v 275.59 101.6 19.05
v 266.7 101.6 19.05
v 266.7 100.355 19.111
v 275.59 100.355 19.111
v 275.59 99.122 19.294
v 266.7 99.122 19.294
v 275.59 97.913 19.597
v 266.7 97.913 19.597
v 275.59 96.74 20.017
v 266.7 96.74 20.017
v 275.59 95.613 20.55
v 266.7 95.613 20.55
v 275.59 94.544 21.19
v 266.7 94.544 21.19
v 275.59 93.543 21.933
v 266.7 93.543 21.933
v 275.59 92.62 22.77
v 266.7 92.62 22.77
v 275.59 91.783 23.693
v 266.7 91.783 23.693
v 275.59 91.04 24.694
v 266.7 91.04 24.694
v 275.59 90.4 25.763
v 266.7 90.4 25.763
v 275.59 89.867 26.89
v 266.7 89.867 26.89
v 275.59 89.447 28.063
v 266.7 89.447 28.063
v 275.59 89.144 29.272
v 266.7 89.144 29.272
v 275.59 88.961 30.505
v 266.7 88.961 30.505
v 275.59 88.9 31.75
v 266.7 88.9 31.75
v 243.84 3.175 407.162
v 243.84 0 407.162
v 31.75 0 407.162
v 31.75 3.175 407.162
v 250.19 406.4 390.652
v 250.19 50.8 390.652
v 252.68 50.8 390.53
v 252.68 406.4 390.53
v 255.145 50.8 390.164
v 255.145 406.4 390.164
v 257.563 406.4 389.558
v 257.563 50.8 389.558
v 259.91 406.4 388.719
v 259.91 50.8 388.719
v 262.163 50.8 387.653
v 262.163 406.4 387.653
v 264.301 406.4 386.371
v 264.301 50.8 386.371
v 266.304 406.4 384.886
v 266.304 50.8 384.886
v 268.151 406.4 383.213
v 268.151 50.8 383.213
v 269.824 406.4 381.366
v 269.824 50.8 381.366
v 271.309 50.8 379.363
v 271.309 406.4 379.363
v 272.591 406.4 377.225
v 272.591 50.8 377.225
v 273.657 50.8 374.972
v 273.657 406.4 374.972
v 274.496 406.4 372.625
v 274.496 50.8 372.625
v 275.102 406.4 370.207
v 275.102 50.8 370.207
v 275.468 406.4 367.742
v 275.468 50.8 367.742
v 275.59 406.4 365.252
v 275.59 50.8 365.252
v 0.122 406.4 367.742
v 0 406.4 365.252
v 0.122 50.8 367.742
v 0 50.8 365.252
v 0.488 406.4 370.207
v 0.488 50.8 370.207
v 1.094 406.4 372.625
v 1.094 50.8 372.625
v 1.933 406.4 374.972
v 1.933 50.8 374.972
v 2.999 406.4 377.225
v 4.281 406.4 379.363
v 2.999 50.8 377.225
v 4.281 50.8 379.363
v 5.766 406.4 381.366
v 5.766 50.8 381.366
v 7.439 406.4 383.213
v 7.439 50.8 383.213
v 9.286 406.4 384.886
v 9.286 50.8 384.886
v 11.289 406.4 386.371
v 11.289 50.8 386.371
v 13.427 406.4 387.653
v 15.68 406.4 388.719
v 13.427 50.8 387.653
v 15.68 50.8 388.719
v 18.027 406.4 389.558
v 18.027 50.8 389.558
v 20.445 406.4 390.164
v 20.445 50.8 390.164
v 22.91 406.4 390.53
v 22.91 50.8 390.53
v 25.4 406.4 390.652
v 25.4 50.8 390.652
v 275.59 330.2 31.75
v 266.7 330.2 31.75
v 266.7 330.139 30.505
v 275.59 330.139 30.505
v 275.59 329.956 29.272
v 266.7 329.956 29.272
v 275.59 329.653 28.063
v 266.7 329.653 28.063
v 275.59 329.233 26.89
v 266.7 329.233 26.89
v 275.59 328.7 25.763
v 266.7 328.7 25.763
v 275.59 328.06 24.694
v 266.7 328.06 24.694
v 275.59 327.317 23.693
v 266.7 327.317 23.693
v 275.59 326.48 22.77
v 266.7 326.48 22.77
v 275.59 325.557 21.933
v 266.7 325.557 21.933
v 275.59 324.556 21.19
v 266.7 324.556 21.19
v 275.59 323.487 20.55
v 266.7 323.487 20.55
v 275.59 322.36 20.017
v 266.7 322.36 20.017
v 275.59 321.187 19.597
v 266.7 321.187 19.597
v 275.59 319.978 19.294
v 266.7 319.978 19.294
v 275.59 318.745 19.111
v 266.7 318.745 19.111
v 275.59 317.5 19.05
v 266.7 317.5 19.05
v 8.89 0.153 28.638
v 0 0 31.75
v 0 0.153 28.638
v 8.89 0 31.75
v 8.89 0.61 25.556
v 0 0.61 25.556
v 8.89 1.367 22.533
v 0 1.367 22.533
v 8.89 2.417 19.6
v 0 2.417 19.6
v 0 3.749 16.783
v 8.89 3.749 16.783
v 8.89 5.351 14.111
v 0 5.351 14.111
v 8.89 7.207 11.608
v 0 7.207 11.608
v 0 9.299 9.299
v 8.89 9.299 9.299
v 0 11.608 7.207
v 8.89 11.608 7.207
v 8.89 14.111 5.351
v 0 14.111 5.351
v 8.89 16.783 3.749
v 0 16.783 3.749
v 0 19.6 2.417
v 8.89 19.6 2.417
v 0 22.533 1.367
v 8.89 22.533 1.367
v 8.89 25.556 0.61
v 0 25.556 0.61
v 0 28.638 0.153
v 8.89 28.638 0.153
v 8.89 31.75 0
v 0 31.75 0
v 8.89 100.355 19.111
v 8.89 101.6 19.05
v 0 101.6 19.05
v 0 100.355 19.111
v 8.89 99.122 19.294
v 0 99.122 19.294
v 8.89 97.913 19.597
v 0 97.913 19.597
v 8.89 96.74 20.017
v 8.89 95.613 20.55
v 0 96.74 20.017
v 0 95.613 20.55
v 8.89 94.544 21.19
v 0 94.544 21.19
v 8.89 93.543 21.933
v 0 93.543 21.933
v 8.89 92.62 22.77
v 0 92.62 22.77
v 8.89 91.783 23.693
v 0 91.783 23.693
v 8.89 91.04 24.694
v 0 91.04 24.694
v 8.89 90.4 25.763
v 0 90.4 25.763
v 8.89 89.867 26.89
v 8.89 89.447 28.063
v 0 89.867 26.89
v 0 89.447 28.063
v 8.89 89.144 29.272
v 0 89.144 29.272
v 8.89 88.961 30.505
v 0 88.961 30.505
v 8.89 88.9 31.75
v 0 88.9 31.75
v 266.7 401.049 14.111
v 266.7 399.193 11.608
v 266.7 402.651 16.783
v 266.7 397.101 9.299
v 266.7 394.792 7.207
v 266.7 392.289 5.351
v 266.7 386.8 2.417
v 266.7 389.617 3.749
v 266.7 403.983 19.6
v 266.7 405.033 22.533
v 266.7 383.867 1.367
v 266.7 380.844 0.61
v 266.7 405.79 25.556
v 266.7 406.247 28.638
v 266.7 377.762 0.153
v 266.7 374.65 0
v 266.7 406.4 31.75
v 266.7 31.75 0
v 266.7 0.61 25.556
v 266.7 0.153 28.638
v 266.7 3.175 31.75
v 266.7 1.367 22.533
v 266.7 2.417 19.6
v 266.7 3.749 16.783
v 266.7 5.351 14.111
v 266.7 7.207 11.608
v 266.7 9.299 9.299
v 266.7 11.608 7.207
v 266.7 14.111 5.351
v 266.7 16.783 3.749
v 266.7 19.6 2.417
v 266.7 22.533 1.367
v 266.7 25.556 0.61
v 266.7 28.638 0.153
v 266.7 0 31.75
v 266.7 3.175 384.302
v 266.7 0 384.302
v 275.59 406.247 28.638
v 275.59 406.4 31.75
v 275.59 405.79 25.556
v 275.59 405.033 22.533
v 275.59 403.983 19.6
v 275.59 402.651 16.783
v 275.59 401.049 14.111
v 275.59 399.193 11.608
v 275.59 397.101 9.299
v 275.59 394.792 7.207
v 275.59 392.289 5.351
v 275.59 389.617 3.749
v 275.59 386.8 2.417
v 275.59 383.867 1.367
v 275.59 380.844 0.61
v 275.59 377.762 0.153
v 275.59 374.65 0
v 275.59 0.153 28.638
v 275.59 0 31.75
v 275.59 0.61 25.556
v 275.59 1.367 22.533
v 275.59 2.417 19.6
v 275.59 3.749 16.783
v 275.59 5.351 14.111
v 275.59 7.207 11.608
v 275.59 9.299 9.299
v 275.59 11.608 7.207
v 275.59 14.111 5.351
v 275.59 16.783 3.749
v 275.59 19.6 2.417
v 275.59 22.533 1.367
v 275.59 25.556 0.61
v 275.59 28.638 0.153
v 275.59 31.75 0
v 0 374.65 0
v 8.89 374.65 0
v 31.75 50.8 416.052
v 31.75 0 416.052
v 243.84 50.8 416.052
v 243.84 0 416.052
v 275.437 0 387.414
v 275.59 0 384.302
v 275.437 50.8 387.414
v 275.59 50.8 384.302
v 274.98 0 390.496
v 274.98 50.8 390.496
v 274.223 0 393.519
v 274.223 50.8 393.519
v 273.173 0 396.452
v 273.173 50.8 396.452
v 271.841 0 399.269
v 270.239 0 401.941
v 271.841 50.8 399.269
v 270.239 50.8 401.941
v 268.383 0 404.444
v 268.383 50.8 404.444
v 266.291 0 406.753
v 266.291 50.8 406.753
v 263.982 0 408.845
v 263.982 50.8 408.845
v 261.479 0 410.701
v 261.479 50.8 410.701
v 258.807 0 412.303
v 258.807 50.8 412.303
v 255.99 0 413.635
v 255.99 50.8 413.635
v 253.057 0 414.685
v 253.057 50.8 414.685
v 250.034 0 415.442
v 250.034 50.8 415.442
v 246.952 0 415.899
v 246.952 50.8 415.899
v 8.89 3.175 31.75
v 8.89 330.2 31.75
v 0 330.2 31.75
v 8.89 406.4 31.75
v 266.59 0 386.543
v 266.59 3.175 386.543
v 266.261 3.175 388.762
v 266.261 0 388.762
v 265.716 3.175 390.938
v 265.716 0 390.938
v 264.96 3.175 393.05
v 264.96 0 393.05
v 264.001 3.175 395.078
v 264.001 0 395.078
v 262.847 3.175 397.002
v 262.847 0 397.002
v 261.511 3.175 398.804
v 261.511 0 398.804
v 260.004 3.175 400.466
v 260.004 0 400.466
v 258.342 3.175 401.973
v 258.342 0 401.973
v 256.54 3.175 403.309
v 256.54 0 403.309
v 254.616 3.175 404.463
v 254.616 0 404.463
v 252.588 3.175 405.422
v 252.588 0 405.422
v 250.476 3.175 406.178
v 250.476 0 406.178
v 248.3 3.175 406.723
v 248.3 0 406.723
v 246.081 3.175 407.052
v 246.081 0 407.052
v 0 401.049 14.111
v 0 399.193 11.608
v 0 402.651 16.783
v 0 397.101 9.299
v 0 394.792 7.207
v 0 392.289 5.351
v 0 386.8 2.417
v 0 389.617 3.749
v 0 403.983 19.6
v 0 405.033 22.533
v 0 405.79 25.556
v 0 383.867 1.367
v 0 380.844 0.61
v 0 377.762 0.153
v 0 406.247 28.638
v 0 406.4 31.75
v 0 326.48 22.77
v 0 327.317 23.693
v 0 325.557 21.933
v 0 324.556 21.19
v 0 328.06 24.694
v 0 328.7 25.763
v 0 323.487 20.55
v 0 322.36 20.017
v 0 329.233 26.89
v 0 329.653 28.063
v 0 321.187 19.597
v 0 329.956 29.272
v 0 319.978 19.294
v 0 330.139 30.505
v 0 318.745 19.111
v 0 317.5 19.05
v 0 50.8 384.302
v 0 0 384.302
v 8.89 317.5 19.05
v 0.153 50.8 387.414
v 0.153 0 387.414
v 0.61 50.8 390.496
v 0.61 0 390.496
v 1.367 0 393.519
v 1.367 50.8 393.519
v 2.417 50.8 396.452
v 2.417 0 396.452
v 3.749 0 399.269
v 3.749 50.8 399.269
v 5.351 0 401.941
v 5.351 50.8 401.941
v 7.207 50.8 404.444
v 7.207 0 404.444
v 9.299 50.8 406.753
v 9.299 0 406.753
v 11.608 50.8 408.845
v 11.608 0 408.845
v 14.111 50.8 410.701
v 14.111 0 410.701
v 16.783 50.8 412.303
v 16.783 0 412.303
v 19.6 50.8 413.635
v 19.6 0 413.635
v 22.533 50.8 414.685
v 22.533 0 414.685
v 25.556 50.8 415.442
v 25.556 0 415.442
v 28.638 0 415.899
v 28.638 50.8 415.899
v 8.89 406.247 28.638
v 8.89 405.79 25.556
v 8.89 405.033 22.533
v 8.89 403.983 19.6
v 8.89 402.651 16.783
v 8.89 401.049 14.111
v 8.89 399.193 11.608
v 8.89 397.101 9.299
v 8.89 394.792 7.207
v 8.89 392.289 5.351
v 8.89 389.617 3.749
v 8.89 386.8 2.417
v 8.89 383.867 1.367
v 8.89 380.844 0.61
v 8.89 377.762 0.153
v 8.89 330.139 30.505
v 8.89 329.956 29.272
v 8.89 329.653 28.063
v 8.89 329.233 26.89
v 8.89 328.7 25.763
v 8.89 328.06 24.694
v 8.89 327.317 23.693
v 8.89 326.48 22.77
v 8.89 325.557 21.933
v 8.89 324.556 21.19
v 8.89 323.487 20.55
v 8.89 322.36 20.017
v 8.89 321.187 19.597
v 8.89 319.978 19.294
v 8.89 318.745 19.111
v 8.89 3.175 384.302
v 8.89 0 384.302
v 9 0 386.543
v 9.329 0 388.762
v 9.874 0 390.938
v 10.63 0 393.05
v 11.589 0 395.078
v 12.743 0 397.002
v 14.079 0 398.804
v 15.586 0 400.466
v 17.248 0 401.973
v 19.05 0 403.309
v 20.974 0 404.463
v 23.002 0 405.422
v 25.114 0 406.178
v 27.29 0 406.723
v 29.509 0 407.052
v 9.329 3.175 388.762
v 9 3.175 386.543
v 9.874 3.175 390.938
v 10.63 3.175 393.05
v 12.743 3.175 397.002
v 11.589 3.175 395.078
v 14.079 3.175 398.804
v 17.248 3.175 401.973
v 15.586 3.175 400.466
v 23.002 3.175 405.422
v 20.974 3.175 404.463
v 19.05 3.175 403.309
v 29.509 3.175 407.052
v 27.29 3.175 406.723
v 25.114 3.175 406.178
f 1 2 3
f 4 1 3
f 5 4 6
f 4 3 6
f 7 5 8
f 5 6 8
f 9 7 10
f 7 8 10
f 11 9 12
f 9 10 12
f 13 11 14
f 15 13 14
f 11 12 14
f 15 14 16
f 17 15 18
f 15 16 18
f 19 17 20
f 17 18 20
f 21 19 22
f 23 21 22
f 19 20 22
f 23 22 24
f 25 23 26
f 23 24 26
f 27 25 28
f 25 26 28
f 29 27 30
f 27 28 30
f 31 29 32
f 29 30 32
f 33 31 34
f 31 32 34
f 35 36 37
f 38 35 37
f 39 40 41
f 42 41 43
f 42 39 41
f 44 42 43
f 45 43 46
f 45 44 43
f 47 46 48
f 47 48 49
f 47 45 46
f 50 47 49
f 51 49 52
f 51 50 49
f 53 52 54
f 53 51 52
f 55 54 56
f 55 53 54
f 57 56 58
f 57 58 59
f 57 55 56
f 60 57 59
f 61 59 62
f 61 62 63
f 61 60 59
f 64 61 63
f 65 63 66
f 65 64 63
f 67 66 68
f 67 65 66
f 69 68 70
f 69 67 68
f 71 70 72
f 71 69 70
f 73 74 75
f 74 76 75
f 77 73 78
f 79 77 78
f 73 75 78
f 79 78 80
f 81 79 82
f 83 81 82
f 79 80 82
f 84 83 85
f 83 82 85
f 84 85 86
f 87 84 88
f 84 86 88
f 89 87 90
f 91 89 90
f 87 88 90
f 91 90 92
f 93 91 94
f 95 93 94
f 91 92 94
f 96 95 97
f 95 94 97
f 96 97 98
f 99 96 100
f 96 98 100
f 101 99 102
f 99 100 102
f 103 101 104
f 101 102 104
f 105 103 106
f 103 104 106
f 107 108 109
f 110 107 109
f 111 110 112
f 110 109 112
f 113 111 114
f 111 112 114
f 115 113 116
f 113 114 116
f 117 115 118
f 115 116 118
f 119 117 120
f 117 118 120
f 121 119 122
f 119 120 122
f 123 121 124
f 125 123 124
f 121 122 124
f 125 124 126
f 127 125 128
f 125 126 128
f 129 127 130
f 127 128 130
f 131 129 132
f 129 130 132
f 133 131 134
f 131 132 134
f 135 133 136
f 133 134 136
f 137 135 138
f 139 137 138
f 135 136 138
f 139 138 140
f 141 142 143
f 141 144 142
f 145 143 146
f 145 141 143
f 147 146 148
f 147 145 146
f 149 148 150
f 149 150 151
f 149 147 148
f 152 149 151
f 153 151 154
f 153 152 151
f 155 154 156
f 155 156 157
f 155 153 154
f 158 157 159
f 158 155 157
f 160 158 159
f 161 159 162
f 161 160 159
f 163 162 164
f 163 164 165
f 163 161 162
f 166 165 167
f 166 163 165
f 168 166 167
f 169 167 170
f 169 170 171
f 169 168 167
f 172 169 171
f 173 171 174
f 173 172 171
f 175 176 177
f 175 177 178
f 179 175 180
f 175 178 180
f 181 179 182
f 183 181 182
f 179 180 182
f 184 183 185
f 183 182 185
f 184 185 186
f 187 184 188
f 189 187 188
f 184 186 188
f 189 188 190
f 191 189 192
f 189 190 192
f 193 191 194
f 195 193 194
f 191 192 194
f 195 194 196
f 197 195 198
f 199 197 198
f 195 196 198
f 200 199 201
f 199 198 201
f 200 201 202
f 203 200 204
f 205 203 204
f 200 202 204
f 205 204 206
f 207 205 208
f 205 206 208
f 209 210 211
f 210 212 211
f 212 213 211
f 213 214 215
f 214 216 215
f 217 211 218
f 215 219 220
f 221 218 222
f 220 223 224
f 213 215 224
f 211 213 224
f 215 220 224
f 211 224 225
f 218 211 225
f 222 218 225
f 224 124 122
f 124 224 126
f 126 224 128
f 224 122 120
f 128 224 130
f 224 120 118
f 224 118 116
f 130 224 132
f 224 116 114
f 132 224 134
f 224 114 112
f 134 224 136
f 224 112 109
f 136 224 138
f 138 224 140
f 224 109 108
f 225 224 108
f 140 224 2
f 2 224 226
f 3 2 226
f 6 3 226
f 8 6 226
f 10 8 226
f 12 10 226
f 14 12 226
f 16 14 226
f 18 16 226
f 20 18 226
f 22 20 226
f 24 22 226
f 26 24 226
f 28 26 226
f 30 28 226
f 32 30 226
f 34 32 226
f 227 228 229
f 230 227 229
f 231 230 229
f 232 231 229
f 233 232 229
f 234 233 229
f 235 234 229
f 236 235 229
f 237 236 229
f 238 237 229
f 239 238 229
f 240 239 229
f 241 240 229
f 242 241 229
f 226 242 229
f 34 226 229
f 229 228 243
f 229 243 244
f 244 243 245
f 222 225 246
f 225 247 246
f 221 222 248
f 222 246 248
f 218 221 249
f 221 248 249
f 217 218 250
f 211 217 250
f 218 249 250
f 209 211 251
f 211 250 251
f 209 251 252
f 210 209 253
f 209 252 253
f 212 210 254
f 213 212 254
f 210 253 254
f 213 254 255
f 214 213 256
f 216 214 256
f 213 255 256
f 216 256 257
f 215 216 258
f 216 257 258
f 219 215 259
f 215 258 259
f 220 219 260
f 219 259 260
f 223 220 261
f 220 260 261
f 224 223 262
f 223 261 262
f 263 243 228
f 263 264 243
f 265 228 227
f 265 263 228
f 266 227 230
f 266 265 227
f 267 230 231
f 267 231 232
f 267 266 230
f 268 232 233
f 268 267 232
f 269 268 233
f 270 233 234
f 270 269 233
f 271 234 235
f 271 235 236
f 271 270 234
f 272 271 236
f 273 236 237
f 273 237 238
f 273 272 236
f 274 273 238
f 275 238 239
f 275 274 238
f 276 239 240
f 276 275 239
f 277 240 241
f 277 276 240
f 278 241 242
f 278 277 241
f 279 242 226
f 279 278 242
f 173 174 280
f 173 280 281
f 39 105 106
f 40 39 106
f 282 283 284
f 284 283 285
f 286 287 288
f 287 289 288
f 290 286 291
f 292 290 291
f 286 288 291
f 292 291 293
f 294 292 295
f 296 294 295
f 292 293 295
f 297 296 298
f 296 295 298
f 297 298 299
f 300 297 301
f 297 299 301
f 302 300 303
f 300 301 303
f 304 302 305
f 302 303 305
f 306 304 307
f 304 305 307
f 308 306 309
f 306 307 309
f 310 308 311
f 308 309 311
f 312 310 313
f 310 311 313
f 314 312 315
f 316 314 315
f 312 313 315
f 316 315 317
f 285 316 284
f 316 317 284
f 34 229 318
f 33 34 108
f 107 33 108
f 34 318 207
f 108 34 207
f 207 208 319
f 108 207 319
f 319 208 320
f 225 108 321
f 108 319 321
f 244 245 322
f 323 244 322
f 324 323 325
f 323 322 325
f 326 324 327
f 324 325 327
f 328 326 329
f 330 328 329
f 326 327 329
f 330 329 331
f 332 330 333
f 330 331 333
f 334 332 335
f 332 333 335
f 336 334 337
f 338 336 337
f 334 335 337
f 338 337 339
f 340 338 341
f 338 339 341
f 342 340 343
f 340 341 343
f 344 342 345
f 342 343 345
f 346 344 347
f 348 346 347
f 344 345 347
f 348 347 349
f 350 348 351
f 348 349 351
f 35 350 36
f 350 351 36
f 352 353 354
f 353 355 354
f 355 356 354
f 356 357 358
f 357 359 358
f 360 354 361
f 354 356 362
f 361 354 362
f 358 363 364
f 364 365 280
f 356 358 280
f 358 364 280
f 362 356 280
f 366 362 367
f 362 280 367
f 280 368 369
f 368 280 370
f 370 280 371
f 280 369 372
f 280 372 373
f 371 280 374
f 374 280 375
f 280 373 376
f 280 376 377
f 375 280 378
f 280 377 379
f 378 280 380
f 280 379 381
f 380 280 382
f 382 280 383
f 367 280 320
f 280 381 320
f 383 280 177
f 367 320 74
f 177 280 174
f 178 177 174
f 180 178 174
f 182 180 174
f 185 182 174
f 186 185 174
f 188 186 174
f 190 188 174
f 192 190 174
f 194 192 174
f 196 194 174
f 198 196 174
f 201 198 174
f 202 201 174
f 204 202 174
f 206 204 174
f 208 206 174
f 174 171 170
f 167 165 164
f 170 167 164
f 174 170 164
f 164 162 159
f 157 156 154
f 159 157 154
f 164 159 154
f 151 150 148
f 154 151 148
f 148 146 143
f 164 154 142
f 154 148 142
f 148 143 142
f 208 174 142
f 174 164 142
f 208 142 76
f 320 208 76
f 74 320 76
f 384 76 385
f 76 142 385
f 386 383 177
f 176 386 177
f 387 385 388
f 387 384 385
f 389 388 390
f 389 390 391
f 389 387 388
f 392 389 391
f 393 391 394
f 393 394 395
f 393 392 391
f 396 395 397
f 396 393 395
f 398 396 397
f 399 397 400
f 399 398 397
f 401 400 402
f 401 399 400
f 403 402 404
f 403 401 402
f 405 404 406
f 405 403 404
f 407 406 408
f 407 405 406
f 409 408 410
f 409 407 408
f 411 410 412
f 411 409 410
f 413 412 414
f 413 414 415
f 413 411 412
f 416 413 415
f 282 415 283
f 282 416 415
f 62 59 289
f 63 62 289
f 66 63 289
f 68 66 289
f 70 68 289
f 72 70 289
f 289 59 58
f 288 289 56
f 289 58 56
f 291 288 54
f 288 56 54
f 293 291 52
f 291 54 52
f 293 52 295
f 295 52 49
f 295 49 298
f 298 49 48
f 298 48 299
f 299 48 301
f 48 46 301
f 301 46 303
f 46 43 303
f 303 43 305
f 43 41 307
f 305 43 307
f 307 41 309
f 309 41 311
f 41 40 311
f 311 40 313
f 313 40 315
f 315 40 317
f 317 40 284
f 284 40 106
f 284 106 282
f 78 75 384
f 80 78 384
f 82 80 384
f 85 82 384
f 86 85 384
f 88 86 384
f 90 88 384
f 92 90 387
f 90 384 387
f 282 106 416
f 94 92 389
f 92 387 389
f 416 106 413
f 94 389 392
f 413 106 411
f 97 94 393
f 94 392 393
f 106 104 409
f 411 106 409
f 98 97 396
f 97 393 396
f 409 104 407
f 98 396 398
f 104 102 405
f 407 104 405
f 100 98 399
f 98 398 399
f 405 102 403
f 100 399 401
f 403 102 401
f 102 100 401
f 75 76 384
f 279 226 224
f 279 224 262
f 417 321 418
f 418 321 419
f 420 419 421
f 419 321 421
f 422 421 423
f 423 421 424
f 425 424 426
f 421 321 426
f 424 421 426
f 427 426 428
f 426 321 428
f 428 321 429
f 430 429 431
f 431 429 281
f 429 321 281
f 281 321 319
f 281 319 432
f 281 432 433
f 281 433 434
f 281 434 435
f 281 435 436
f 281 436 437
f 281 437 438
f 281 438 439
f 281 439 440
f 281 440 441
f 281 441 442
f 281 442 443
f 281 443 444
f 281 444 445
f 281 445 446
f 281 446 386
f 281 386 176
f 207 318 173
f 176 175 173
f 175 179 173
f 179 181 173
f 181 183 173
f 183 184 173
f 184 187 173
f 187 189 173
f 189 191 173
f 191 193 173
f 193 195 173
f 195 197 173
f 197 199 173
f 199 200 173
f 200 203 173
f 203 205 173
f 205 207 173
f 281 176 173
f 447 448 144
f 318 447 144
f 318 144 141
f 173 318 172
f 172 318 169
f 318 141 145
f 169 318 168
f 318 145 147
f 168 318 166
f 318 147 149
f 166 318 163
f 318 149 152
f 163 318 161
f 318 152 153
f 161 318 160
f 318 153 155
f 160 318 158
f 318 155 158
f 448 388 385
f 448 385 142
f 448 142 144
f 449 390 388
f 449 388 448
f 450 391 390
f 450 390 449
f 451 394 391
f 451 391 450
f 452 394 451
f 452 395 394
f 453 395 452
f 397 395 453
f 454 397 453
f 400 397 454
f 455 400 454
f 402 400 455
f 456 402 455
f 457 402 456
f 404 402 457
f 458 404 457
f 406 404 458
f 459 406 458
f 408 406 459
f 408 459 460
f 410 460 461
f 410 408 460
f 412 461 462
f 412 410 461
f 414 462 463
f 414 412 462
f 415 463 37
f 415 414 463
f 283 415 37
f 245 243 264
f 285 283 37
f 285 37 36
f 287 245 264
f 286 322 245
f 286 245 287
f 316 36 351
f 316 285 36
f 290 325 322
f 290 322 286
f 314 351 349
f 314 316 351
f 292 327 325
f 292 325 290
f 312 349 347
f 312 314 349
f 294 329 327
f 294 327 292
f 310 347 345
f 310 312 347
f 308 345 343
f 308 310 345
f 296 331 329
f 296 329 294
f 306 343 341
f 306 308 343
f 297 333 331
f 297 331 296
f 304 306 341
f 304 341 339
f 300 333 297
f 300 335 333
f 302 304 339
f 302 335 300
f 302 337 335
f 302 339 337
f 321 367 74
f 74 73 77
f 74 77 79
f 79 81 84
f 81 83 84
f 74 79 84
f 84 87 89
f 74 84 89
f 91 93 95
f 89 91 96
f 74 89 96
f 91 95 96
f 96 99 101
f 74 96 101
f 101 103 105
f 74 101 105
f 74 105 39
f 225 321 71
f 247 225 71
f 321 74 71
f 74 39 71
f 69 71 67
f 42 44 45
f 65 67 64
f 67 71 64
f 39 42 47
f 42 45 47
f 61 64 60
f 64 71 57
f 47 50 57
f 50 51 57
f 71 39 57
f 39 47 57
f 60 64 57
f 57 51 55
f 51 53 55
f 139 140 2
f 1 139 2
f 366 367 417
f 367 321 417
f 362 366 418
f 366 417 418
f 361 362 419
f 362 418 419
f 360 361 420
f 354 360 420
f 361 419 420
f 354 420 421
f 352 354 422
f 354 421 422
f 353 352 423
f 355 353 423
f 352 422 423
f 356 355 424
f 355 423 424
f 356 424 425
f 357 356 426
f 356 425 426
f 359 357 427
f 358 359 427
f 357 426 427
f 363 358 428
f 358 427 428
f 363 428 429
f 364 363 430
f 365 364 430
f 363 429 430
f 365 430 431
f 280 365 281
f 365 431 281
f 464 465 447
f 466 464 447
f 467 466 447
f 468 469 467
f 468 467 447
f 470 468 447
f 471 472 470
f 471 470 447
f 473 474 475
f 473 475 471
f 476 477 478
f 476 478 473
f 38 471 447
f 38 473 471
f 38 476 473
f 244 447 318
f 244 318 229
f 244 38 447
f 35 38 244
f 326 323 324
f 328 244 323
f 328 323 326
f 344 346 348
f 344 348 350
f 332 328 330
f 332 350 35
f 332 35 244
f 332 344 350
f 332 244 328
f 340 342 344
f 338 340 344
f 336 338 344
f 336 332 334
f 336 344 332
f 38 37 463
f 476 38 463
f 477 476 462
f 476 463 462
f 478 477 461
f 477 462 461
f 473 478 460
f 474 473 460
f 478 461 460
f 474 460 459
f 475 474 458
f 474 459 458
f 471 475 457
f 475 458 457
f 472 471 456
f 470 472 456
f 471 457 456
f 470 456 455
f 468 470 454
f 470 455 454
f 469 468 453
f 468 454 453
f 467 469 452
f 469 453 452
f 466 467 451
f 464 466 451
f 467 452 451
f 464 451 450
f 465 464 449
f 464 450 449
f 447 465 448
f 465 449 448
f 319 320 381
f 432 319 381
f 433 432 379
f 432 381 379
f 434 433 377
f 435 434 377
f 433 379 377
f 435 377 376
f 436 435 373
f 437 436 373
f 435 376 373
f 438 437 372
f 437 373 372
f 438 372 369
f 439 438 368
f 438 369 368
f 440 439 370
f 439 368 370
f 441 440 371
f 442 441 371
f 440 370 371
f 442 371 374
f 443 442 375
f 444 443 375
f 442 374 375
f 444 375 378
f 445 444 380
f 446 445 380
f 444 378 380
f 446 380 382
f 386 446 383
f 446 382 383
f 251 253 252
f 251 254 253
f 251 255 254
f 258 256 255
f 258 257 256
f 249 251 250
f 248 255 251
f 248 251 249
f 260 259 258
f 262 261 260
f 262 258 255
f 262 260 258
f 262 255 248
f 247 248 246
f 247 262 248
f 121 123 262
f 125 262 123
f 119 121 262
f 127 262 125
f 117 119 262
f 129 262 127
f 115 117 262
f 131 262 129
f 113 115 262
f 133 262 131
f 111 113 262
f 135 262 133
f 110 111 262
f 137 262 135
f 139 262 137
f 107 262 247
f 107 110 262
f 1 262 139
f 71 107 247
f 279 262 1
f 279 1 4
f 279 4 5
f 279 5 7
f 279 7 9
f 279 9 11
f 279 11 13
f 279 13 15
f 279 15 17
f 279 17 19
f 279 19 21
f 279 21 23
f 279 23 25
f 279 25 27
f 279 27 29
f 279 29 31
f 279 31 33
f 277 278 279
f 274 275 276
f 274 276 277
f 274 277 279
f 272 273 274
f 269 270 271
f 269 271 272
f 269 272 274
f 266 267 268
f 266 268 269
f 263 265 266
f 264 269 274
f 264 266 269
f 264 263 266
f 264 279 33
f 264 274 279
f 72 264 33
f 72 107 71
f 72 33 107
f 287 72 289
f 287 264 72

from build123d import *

# Parameters (mm, degrees)
F0_W      = 275.59
F0_H      = 416.052
F1_DEPTH  = 406.4
F3_DEPTH  = 406.401
F4_W      = 355.6
F4_H      = 25.4
F5_DEPTH  = 275.591
F6_R      = 31.75
F7_R      = 25.4
F8_R      = 31.75
F10_DEPTH = 3.175


with BuildPart() as f1:
    # F0 (on Front) → F1 (new body)
    with BuildSketch(Plane.XZ):
        with Locations((137.795, 208.026)):
            Rectangle(F0_W, F0_H)
    extrude(amount=-F1_DEPTH)

    # F2 (on face) → F3 (cut, through all)
    with BuildSketch(Plane.XZ):
        Polygon((8.89, 31.75), (8.89, 0), (137.795, 0), (266.7, 0), (266.7, 31.75), (137.795, 31.75), align=None)
    extrude(amount=-F3_DEPTH, mode=Mode.SUBTRACT)

    # F4 (on face) → F5 (cut, through all)
    with BuildSketch(Plane(origin=(0, 0, 0), x_dir=(0, -1, 0), z_dir=(-1, 0, 0))):
        with Locations((-228.6, 403.352)):
            Rectangle(F4_W, F4_H)
        with BuildLine():
            ThreePointArc((-330.2, 31.75), (-326.480256, 22.769744), (-317.5, 19.05))
            Line((-317.5, 19.05), (-101.6, 19.05))
            ThreePointArc((-101.6, 19.05), (-92.619744, 22.769744), (-88.9, 31.75))
            Line((-88.9, 31.75), (-330.2, 31.75))
        make_face()
    extrude(amount=-F5_DEPTH, mode=Mode.SUBTRACT)

    # F6
    f6_edges = [f1.edges().sort_by_distance(p)[0] for p in [
        (4.445, 406.4, 0),
        (271.145, 406.4, 0),
        (271.145, 0, 0),
        (4.445, 0, 0),
    ]]
    fillet(f6_edges, radius=F6_R)

    # F7
    f7_edges = [f1.edges().sort_by_distance(p)[0] for p in [
        (0, 228.6, 390.652),
        (275.59, 228.6, 390.652),
    ]]
    fillet(f7_edges, radius=F7_R)

    # F8
    f8_edges = [f1.edges().sort_by_distance(p)[0] for p in [
        (275.59, 25.4, 416.052),
        (0, 25.4, 416.052),
    ]]
    fillet(f8_edges, radius=F8_R)

    # F9 (on face) → F10 (cut)
    with BuildSketch(Plane.XZ):
        with BuildLine():
            Line((8.89, 384.302), (8.89, 31.75))
            Line((8.89, 31.75), (266.7, 31.75))
            Line((266.7, 31.75), (266.7, 384.302))
            ThreePointArc((266.7, 384.302), (260.004461, 400.466461), (243.84, 407.162))
            Line((243.84, 407.162), (31.75, 407.162))
            ThreePointArc((31.75, 407.162), (15.585539, 400.466461), (8.89, 384.302))
        make_face()
    extrude(amount=-F10_DEPTH, mode=Mode.SUBTRACT)


solid = f1.part
